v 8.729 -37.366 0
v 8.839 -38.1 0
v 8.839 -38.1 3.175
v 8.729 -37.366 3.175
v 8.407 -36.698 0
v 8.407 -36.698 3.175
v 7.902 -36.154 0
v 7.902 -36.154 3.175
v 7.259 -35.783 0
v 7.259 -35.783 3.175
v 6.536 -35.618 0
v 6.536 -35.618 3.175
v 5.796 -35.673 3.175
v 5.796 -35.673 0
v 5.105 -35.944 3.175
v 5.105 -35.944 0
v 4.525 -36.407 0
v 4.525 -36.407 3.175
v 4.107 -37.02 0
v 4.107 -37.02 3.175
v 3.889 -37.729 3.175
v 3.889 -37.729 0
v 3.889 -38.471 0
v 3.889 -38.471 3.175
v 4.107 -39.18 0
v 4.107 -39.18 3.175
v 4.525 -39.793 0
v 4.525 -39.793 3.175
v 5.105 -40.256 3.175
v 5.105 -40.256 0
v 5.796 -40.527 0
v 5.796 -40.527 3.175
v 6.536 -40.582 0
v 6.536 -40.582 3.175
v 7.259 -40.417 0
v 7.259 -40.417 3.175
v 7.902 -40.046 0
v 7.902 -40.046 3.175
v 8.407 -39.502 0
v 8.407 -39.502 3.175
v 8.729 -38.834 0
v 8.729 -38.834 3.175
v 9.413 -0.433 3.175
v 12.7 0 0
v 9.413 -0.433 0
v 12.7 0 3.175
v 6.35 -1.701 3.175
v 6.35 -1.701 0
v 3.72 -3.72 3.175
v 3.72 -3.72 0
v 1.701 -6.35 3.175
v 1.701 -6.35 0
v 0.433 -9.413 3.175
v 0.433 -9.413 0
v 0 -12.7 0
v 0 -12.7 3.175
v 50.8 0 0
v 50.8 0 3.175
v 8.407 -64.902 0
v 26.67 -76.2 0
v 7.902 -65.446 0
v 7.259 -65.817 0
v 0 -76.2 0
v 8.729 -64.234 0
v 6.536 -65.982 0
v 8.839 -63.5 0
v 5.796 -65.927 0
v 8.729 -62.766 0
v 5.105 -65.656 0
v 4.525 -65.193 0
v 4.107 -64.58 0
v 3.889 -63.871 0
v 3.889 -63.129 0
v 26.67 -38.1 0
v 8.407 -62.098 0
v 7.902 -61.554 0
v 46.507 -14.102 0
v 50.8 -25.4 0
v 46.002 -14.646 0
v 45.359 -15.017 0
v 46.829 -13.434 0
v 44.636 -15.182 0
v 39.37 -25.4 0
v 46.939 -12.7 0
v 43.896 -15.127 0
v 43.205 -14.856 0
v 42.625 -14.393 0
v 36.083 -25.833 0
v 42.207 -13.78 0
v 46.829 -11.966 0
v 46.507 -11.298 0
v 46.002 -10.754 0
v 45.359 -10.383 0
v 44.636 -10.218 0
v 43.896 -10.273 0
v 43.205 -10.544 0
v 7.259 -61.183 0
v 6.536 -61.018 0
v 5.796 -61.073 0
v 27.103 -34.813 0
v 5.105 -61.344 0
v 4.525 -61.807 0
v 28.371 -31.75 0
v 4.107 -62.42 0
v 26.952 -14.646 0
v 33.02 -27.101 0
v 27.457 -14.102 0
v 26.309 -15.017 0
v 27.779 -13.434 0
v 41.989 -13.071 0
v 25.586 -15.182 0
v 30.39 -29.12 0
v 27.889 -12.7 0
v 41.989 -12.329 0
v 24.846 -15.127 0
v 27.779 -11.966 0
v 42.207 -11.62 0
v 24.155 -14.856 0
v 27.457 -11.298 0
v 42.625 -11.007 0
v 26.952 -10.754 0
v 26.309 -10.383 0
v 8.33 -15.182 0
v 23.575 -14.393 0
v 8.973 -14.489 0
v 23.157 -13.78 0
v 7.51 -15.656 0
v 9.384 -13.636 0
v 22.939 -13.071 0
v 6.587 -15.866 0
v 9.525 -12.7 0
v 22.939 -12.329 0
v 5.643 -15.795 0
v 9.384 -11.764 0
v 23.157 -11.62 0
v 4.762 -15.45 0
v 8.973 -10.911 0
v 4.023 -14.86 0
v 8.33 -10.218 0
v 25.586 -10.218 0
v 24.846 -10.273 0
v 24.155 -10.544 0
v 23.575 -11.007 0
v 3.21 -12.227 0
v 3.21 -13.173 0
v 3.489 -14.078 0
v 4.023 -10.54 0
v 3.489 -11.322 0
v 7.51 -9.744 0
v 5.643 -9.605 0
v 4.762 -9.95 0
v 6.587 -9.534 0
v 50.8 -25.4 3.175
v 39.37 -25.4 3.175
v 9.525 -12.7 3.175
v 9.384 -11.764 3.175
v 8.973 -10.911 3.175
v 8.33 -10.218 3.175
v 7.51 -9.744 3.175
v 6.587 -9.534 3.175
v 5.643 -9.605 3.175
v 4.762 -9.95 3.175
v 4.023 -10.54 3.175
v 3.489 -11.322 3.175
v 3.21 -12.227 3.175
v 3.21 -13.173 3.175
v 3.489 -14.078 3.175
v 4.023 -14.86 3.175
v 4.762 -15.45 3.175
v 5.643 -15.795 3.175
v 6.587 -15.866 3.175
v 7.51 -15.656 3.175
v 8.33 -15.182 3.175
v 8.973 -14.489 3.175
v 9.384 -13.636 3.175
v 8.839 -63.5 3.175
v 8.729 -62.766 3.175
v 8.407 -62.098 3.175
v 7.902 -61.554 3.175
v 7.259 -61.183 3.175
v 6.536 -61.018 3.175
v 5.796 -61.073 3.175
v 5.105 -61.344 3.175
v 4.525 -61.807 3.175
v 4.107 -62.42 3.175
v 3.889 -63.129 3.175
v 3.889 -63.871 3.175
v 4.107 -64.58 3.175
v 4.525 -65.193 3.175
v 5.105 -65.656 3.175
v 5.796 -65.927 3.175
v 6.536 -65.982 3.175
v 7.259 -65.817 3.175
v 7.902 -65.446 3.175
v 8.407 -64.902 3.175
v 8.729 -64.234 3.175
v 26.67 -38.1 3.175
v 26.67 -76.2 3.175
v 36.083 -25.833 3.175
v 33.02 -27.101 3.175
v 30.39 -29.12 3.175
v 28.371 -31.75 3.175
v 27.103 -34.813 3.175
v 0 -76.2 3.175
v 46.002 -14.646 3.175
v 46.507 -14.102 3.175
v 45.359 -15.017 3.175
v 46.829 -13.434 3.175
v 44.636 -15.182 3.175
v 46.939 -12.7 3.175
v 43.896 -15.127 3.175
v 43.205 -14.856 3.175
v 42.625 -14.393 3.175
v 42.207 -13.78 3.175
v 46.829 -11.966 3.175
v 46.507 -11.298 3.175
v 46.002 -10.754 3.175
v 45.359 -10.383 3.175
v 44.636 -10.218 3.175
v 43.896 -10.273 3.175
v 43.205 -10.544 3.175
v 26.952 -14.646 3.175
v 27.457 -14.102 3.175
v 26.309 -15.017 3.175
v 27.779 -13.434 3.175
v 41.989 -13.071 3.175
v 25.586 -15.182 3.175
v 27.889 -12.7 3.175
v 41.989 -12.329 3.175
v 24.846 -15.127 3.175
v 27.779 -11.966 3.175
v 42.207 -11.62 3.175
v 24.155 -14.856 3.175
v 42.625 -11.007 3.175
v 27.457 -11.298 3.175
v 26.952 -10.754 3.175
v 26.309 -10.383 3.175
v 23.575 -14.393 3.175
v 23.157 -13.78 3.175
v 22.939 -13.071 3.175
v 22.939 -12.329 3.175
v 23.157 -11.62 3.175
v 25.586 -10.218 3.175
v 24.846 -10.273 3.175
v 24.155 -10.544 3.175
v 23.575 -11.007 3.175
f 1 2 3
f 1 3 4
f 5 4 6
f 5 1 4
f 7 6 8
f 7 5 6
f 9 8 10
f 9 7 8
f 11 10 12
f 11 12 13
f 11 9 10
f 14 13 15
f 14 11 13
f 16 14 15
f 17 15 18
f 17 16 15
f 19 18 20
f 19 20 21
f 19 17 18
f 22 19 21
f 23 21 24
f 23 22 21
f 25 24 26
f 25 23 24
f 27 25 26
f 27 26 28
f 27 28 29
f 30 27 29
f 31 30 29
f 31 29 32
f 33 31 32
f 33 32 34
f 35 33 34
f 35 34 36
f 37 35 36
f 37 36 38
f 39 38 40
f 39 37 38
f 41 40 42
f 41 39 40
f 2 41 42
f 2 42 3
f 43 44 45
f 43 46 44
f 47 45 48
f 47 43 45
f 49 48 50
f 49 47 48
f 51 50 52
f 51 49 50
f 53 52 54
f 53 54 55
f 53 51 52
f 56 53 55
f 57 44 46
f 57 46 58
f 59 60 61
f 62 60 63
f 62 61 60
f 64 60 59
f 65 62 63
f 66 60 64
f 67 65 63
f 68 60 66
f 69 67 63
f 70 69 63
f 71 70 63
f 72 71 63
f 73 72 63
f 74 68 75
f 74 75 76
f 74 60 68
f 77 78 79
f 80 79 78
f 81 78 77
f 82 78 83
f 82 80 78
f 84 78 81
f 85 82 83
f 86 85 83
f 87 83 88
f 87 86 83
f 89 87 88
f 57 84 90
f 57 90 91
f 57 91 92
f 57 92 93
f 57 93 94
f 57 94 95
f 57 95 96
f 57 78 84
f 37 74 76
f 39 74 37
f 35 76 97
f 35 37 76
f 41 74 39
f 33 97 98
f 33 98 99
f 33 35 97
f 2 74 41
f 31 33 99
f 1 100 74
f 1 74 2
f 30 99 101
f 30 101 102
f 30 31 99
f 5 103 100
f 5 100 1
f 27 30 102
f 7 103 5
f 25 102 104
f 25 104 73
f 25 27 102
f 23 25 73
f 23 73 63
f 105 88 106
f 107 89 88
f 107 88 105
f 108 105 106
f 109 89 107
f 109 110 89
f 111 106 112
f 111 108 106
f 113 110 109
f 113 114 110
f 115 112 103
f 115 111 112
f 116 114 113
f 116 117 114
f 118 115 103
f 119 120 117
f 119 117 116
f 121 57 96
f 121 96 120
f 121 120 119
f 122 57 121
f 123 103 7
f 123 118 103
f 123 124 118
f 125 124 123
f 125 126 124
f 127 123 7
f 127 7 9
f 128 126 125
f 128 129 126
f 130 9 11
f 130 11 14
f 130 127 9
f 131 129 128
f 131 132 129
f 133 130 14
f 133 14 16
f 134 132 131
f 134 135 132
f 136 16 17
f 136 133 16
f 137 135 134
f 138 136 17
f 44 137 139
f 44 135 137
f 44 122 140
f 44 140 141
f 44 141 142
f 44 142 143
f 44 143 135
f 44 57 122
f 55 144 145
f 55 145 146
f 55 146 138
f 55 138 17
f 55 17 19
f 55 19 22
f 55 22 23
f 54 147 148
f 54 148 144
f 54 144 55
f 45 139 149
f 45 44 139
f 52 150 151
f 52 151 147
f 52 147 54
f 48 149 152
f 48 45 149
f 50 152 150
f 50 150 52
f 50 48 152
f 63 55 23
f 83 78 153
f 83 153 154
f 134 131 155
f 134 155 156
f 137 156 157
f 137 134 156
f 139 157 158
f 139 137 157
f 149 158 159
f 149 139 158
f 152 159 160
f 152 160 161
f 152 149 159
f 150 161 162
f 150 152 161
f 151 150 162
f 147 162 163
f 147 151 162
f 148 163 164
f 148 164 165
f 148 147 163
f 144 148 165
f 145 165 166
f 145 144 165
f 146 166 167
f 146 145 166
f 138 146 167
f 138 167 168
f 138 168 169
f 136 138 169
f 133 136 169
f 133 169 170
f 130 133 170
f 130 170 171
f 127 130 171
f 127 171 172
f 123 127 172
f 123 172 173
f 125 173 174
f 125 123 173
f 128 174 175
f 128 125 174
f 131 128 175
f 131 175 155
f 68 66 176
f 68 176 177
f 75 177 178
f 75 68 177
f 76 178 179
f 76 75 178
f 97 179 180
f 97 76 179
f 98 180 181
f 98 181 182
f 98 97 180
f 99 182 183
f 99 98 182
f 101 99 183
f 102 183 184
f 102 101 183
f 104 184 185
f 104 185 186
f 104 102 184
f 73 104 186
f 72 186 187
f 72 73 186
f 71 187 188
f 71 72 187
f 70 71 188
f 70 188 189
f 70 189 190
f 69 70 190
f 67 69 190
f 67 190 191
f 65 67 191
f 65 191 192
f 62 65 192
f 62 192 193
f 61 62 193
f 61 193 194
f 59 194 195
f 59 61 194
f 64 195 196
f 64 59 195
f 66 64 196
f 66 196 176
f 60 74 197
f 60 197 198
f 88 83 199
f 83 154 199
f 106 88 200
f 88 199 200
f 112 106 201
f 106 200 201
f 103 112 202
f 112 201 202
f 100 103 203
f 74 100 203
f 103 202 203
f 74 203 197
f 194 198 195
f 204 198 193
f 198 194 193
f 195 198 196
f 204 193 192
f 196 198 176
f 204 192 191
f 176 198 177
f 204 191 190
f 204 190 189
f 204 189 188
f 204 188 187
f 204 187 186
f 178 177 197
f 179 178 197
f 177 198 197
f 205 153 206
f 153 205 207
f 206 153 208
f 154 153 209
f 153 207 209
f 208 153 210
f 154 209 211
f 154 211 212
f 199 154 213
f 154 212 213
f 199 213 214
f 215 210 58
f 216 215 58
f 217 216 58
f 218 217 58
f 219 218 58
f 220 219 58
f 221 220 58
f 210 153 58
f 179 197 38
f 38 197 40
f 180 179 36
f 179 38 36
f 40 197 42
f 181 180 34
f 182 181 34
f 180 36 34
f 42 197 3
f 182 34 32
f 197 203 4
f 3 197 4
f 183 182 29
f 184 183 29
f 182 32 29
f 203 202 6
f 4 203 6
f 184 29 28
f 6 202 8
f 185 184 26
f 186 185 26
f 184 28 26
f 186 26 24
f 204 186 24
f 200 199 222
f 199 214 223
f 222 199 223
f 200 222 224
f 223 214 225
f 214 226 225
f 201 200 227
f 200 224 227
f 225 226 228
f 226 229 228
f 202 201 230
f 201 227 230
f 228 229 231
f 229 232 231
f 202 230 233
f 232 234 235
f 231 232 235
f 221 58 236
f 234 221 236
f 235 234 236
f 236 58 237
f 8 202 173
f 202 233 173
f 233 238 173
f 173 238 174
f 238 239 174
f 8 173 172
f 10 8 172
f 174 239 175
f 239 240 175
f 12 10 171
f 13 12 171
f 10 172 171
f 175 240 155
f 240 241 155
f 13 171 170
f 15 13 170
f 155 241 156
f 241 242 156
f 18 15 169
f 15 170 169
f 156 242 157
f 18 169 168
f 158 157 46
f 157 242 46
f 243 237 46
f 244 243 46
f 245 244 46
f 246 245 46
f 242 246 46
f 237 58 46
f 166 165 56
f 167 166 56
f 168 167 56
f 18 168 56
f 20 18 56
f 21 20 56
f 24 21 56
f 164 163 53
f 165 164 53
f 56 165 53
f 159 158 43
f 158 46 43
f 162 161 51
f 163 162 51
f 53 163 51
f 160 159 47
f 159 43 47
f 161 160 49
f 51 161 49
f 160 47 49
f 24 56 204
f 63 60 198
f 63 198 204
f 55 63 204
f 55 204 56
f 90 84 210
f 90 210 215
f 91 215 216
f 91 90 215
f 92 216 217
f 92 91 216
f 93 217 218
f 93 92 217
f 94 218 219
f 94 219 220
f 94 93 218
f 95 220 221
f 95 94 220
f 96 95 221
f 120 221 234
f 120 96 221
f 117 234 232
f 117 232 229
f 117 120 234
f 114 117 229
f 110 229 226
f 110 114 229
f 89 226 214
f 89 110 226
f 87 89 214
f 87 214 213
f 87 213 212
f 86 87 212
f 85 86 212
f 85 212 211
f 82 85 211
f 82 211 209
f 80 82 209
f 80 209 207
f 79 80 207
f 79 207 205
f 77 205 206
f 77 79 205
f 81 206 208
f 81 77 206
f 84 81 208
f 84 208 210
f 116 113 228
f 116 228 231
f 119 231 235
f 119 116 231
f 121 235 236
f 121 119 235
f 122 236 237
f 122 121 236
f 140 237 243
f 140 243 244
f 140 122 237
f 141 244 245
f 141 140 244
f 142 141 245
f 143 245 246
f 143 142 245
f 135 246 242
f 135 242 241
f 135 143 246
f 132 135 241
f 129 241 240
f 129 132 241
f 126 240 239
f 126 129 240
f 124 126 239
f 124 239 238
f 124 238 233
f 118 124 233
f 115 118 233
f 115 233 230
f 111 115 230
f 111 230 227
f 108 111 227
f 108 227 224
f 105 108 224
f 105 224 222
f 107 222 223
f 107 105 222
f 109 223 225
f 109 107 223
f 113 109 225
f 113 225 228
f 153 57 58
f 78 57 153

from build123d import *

# Parameters (mm, degrees)
SKETCH1_R           = 2.4892
SKETCH1_R_2         = 3.175
BOSS_EXTRUDE1_DEPTH = 3.175
FILLET1_R           = 12.7


with BuildPart() as part:
    # Sketch1 → Boss-Extrude1 (new body)
    with BuildSketch(Plane.XY):
        Polygon((0, 0), (50.8, 0), (50.8, -25.4), (26.67, -25.4), (26.67, -76.2), (0, -76.2), align=None)
        with Locations((44.45, -12.7)):
            Circle(SKETCH1_R, mode=Mode.SUBTRACT)
        with Locations((25.4, -12.7)):
            Circle(SKETCH1_R, mode=Mode.SUBTRACT)
        with Locations((6.35, -12.7)):
            Circle(SKETCH1_R_2, mode=Mode.SUBTRACT)
        with Locations((6.35, -38.1)):
            Circle(SKETCH1_R, mode=Mode.SUBTRACT)
        with Locations((6.35, -63.5)):
            Circle(SKETCH1_R, mode=Mode.SUBTRACT)
    extrude(amount=BOSS_EXTRUDE1_DEPTH)

    # Fillet1
    fillet1_edges = [part.edges().sort_by_distance(p)[0] for p in [
        (0, 0, 1.5875),
        (26.67, -25.4, 1.5875),
    ]]
    fillet(fillet1_edges, radius=FILLET1_R)


solid = part.part
